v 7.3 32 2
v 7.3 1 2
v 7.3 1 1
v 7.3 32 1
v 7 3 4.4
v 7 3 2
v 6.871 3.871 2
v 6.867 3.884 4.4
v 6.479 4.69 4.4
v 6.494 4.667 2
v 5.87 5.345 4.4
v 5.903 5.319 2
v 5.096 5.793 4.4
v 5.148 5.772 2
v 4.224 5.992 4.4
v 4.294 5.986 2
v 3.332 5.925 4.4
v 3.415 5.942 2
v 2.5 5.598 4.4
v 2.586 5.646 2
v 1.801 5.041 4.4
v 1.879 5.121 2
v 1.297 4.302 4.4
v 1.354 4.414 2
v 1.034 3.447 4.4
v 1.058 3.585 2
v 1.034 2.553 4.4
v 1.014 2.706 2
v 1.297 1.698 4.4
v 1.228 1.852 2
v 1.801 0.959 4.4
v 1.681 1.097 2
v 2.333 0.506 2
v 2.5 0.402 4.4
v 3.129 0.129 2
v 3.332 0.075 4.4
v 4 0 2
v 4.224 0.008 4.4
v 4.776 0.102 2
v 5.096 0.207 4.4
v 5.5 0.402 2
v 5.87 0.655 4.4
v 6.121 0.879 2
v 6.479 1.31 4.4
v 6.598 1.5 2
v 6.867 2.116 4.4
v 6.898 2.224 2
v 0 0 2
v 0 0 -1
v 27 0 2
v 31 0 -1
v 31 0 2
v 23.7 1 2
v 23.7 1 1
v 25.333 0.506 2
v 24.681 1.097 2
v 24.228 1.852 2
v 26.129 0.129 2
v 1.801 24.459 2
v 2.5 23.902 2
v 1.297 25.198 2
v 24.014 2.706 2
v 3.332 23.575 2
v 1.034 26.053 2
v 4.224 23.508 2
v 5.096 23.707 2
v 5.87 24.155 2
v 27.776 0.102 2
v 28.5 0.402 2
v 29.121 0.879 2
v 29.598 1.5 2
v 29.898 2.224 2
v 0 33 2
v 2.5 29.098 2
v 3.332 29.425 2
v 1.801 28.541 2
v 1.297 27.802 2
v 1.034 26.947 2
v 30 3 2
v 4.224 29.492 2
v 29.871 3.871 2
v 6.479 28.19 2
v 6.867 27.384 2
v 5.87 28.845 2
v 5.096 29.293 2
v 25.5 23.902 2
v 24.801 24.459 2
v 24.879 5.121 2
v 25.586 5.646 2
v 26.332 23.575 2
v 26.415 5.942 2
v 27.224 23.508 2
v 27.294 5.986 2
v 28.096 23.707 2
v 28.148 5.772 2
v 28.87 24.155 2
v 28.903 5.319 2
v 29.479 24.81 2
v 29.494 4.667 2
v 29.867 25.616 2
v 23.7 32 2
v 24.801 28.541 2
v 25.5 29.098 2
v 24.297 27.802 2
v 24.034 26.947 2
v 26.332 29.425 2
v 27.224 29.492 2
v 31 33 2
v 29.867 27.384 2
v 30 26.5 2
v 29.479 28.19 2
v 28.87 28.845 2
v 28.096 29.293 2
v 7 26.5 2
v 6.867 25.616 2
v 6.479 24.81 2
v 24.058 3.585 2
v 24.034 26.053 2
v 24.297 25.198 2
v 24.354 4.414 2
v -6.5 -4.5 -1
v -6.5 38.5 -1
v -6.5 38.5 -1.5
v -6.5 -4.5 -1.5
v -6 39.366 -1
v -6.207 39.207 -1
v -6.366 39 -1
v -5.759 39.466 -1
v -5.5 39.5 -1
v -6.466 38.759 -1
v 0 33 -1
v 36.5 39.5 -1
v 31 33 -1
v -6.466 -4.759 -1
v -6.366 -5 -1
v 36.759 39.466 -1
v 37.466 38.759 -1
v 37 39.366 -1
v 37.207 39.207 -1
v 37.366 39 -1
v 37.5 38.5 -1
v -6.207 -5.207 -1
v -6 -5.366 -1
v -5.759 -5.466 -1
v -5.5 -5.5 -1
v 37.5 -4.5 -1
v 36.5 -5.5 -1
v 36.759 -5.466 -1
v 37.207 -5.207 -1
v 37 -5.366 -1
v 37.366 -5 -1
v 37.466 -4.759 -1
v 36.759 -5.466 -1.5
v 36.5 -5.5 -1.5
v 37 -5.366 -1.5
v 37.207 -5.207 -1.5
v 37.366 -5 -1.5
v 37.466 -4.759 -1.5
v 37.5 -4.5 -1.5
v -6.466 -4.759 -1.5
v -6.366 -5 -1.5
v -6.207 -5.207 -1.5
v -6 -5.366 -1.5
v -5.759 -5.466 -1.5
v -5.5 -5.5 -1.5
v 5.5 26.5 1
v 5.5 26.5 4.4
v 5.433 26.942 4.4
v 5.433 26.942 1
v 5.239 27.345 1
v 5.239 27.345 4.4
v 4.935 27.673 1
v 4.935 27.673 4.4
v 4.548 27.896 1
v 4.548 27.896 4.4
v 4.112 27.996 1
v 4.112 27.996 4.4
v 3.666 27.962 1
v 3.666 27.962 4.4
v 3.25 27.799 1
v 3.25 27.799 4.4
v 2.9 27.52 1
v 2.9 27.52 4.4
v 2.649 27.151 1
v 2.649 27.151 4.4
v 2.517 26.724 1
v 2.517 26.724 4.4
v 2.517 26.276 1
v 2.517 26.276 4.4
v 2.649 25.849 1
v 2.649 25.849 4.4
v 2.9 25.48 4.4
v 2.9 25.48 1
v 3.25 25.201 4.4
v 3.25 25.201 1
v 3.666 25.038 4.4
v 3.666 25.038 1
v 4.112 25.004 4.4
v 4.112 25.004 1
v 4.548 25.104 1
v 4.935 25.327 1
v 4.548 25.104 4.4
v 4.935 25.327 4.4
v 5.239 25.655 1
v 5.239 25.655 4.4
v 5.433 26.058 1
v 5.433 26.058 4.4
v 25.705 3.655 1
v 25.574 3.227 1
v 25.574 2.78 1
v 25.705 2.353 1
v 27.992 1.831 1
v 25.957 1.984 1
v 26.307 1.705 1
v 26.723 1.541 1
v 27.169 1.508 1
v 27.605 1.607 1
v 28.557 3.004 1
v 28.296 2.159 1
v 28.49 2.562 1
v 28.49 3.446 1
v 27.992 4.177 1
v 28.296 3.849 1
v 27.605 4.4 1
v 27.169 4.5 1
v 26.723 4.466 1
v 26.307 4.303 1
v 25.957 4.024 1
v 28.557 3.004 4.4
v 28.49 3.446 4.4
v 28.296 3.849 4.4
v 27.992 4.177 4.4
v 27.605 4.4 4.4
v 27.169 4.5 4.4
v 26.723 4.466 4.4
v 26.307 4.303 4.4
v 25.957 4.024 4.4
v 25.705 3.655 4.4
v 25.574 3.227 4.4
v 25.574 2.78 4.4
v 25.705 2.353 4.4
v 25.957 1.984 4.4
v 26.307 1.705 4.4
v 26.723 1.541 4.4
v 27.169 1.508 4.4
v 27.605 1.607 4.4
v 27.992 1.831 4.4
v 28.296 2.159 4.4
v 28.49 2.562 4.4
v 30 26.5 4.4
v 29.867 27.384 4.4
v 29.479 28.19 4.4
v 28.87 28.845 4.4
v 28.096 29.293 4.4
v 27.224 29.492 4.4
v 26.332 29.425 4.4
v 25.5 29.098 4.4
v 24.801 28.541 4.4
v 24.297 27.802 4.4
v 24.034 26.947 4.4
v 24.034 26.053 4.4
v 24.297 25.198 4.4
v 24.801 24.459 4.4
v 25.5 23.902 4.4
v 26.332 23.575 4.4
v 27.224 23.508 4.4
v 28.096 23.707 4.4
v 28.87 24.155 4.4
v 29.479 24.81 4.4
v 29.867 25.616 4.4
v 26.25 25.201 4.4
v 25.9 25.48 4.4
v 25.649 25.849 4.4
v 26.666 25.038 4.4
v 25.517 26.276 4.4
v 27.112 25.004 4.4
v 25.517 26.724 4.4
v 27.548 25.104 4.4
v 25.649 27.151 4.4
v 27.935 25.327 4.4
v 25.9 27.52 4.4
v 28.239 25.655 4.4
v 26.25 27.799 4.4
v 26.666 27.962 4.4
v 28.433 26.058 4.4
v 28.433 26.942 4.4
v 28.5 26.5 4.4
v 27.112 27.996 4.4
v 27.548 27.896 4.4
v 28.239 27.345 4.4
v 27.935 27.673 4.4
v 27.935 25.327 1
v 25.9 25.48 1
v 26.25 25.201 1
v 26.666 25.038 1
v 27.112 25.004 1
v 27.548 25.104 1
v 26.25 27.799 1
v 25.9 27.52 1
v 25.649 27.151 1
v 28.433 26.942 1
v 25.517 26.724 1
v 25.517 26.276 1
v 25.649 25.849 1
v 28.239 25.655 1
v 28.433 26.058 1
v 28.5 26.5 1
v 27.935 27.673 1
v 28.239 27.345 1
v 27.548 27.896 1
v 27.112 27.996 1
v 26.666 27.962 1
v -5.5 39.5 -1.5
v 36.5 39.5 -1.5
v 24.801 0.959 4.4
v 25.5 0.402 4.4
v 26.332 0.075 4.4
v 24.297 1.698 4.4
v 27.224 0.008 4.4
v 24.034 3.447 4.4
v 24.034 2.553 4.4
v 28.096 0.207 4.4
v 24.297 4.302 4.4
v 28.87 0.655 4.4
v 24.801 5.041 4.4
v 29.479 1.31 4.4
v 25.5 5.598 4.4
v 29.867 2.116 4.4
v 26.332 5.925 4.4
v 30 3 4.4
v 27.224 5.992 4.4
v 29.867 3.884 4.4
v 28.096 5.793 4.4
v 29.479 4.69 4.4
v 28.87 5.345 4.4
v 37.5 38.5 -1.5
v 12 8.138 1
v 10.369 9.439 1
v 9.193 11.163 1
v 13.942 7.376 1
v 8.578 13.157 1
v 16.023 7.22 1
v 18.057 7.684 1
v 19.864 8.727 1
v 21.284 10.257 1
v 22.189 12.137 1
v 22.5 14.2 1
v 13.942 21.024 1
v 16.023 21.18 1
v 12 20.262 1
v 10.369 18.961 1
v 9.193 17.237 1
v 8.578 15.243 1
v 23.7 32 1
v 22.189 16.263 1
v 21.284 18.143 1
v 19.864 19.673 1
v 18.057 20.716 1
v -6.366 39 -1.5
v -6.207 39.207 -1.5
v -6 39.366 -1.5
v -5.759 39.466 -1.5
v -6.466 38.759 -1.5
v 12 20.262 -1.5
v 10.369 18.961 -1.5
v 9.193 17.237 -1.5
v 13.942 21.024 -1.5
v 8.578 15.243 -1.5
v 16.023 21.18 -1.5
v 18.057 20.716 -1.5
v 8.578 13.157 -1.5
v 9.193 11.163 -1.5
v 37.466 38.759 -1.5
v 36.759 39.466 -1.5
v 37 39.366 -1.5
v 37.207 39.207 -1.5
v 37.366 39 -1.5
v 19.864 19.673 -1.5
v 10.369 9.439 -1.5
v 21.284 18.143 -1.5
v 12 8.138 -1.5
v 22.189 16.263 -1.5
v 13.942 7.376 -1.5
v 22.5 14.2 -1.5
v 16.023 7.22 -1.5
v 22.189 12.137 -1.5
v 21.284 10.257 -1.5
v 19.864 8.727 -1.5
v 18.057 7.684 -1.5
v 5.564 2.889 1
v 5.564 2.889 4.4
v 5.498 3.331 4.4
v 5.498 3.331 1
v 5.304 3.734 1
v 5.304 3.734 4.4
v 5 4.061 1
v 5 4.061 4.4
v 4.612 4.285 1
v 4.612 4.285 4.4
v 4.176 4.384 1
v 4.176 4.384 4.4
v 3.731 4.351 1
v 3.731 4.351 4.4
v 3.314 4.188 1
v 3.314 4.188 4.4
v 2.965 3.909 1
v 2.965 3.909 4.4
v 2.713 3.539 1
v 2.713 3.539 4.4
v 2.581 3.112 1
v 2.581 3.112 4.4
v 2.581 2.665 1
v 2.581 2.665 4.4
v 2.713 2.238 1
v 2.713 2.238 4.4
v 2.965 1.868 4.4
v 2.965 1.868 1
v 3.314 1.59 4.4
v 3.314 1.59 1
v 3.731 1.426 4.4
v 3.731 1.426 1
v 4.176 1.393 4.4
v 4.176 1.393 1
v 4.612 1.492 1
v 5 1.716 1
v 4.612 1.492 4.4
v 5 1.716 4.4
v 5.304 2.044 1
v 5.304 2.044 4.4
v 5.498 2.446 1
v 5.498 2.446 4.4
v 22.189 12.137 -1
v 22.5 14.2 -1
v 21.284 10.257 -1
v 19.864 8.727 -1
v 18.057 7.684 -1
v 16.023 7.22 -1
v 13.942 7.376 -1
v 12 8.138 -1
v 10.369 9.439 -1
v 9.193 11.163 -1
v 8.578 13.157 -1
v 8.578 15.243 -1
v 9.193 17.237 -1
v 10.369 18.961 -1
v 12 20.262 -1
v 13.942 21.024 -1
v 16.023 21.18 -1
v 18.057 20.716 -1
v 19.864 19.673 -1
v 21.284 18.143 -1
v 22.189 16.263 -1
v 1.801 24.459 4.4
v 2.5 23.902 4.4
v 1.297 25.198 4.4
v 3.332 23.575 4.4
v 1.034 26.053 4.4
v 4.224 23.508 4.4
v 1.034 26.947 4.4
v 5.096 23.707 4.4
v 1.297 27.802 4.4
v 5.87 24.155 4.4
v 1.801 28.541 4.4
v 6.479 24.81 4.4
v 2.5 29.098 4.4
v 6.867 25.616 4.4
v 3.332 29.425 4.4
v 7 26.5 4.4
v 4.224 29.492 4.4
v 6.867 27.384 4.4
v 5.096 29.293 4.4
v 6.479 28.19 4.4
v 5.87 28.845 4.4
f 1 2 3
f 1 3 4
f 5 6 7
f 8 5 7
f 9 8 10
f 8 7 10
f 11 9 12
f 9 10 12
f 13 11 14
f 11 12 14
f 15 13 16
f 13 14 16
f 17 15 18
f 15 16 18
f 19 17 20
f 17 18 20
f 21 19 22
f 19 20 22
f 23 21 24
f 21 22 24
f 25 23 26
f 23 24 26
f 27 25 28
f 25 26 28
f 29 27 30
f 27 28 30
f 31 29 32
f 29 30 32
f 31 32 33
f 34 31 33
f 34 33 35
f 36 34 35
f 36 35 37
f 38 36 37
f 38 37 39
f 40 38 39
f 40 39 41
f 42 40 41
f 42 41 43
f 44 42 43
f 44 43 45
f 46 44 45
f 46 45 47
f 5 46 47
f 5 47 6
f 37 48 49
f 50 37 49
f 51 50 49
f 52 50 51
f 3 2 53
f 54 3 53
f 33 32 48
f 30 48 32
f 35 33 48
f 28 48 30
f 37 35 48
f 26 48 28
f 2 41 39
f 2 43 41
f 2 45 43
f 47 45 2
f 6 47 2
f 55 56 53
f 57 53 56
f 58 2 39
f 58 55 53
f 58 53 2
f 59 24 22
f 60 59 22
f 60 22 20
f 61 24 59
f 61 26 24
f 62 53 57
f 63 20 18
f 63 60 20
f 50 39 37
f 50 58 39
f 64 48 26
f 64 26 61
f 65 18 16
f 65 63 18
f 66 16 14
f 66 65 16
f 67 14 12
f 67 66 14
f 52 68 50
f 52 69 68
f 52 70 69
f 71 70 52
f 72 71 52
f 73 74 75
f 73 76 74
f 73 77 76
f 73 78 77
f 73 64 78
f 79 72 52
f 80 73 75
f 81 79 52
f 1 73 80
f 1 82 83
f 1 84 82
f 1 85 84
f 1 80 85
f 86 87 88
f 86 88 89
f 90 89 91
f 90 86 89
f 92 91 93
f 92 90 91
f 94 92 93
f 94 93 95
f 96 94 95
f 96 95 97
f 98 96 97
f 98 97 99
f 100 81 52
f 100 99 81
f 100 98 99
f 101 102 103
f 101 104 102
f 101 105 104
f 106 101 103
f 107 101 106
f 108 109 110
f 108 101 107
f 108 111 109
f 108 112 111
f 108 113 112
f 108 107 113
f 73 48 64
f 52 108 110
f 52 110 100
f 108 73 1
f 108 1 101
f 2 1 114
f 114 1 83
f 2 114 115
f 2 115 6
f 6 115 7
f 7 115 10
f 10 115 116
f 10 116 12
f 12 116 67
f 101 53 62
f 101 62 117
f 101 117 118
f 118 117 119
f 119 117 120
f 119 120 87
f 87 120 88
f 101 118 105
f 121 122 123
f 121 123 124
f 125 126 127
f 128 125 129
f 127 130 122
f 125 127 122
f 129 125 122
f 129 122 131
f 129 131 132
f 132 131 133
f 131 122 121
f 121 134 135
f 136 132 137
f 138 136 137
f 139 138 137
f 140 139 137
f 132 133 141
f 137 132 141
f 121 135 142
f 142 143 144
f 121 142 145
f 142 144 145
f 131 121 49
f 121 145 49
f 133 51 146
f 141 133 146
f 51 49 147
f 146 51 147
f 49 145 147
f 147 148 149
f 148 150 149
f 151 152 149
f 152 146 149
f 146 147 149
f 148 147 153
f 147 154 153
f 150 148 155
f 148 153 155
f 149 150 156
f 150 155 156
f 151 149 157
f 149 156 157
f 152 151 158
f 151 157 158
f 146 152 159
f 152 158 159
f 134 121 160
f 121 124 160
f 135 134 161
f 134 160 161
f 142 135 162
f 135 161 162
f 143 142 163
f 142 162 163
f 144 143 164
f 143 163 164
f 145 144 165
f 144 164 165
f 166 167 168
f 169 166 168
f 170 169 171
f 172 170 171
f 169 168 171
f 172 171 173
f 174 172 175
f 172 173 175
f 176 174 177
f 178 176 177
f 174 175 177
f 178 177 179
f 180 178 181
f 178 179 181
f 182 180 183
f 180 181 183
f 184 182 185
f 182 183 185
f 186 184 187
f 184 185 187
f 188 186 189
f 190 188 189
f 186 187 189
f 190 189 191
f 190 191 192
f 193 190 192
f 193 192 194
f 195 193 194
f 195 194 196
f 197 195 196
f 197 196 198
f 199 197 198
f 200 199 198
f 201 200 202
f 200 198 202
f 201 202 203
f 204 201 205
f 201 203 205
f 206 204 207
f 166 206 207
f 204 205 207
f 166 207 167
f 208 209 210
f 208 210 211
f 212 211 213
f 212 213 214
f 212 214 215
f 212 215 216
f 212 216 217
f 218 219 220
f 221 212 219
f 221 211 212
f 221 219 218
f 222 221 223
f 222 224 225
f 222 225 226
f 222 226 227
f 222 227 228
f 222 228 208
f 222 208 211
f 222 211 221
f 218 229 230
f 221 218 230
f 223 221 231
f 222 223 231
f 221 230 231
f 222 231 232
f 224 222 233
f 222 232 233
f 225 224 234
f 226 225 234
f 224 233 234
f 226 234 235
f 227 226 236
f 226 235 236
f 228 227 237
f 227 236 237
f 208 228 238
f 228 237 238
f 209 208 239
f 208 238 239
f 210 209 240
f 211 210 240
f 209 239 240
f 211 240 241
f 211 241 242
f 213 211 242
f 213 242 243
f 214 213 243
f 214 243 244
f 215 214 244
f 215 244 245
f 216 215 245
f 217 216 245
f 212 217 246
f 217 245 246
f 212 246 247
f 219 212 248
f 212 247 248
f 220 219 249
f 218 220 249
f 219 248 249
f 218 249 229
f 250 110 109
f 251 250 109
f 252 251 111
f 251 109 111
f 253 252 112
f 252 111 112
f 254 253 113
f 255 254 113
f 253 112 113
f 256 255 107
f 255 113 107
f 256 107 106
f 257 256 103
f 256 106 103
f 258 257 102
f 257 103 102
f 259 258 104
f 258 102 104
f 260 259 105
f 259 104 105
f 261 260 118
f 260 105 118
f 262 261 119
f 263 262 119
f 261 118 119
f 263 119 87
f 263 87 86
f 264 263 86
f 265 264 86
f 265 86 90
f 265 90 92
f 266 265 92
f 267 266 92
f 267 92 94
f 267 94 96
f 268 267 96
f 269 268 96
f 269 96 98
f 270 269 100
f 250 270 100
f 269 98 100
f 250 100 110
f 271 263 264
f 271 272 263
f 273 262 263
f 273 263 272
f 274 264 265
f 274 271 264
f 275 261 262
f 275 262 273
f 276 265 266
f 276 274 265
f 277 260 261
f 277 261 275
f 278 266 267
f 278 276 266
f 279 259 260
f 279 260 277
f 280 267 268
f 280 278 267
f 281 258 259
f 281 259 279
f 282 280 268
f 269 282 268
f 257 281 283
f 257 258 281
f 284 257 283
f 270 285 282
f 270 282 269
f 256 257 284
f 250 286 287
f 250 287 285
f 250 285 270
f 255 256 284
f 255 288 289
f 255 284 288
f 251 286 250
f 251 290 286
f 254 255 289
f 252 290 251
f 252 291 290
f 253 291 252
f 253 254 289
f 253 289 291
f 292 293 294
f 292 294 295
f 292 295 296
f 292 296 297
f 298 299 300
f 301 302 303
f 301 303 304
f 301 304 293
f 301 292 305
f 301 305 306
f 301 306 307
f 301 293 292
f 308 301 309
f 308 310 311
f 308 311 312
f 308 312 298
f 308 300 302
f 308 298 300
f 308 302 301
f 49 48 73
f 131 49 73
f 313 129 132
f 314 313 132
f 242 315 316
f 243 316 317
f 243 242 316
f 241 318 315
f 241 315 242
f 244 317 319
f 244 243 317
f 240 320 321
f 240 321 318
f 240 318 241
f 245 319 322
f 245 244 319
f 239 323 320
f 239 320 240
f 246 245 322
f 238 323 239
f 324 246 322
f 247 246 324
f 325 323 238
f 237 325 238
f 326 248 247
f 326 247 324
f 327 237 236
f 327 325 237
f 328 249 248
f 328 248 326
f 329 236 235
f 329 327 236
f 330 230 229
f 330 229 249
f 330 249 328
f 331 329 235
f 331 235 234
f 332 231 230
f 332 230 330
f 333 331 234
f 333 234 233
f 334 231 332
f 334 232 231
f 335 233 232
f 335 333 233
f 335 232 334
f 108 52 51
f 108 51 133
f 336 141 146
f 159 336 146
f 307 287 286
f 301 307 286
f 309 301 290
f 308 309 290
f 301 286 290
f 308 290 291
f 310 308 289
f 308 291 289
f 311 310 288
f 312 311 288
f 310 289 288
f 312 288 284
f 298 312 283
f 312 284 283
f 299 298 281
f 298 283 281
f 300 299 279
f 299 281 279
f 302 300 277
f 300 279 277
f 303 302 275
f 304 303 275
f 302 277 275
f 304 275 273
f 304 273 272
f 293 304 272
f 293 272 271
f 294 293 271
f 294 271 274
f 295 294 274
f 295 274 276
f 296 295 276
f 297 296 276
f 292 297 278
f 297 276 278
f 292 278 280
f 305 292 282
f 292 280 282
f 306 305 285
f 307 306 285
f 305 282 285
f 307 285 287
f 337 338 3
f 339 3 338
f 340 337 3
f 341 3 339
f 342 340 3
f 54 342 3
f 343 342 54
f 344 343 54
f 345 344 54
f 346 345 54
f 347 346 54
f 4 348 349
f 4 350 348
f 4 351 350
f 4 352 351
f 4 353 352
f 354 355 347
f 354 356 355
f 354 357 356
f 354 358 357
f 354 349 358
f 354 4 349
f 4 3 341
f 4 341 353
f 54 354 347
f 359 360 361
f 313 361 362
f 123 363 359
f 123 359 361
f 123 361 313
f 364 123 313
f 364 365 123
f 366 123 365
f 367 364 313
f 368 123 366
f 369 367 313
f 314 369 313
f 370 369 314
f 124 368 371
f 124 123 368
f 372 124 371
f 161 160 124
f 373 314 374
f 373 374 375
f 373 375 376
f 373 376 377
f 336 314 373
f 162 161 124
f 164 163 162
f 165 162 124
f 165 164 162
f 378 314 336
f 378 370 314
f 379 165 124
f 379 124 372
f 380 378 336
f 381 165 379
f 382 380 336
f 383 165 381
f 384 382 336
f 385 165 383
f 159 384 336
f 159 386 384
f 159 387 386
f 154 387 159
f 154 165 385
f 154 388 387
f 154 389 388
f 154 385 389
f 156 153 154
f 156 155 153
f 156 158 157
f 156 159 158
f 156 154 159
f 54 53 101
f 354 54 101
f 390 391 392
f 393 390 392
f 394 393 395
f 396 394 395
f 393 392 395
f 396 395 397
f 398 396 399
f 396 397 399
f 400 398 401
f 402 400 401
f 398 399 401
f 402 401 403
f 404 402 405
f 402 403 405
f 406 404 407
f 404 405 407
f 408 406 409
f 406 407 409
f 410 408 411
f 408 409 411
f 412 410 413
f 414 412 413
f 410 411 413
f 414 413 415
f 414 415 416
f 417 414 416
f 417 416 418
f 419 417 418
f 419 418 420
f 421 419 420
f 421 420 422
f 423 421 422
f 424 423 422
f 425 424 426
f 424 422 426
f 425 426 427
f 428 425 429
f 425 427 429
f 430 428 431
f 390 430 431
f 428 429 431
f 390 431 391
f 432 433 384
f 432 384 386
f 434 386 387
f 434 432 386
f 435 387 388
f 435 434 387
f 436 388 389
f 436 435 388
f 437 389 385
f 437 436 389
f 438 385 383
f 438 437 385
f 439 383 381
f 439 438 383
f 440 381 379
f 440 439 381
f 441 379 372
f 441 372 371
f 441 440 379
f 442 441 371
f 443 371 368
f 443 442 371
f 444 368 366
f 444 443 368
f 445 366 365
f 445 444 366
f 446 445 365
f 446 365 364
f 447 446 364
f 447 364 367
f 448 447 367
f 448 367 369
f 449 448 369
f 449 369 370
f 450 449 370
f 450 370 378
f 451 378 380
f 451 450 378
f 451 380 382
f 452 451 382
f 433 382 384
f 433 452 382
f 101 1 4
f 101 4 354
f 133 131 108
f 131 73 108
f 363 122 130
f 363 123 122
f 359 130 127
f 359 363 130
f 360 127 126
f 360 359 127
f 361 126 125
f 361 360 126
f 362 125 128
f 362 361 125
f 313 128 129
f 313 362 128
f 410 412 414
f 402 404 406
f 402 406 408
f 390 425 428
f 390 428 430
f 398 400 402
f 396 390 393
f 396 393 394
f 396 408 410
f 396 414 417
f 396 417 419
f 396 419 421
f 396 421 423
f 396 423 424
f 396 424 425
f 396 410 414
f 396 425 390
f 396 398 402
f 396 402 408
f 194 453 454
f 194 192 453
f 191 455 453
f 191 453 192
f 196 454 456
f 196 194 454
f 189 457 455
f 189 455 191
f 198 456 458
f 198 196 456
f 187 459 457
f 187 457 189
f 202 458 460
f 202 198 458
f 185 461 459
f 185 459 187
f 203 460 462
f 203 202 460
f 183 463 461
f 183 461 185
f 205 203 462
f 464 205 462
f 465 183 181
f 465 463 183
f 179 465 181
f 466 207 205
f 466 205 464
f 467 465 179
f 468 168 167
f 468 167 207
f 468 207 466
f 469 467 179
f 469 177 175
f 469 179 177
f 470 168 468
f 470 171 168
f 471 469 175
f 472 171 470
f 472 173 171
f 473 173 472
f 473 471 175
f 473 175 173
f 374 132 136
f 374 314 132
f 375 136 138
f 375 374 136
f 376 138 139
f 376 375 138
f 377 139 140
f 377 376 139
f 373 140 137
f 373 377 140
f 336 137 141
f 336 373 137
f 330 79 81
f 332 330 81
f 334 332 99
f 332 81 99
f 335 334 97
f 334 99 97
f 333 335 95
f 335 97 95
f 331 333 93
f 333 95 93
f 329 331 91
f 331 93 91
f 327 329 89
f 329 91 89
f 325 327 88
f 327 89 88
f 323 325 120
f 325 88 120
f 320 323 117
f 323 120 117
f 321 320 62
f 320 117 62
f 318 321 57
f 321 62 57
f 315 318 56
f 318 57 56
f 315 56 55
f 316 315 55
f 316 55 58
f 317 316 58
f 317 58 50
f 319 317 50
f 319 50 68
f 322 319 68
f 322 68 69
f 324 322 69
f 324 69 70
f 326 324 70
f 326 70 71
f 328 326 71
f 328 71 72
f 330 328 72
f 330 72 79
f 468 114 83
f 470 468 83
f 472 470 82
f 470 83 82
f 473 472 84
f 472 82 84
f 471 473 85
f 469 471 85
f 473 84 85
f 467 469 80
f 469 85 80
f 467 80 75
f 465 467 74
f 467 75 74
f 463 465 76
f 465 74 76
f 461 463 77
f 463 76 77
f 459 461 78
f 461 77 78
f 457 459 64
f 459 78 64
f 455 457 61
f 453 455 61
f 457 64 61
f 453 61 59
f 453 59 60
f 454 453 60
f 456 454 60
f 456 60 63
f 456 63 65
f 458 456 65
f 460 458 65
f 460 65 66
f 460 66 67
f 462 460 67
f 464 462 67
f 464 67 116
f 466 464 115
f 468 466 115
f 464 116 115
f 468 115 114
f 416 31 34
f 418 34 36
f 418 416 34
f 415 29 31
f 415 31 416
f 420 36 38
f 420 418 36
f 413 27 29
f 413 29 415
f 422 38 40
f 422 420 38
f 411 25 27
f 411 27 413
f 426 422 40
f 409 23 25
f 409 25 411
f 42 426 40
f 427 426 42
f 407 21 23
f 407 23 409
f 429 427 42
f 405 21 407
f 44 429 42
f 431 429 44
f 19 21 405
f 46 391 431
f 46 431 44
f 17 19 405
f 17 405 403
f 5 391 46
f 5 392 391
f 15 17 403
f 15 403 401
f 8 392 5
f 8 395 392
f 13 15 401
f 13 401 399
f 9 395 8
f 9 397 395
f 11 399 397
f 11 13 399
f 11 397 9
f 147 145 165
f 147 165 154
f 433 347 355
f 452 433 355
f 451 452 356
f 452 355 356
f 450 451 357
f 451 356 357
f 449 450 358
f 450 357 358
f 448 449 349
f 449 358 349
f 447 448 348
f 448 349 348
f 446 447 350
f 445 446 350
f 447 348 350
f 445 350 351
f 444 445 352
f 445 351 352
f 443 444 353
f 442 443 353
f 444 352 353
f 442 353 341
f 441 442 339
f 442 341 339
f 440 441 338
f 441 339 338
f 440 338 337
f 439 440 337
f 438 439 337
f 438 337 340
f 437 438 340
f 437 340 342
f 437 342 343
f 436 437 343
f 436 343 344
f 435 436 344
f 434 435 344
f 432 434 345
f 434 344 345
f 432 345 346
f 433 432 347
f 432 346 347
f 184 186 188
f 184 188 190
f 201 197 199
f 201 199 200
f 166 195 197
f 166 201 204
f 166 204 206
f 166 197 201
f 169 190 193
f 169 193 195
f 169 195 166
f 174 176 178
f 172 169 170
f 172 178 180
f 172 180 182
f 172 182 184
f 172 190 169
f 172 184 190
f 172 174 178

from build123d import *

# Parameters (mm, degrees)
F0_W      = 31
F0_H      = 33
F1_DEPTH  = 2
F2_R      = 3
F3_DEPTH  = 2.4
F4_W      = 16.4
F4_H      = 31
F5_DEPTH  = 1
F6_R      = 1.5
F7_DEPTH  = 3.4
F8_R      = 1.5
F9_DEPTH  = 3.4
F10_R     = 7
F11_DEPTH = 25
F12_DEPTH = 1
F13_W     = 44
F13_H     = 45
F13_W_2   = 31
F13_H_2   = 33
F13_R     = 7
F14_DEPTH = 0.5
F15_R     = 1


with BuildPart() as f1:
    # F0 (on Top) → F1 (new body)
    with BuildSketch(Plane.XY):
        with Locations((15.5, 16.5)):
            Rectangle(F0_W, F0_H)
    extrude(amount=F1_DEPTH)

    # F2 (on face) → F3 (join)
    with BuildSketch(Plane.XY.offset(2)):
        with Locations((4, 3)):
            Circle(F2_R)
        with Locations((4, 26.5)):
            Circle(F2_R)
        with Locations((27, 26.5)):
            Circle(F2_R)
        with Locations((27, 3)):
            Circle(F2_R)
    extrude(amount=F3_DEPTH)

    # F4 (on face) → F5 (cut)
    with BuildSketch(Plane.XY.offset(2)):
        with Locations((15.5, 16.5)):
            Rectangle(F4_W, F4_H)
    extrude(amount=-F5_DEPTH, mode=Mode.SUBTRACT)

    # F6 (on face) → F7 (cut)
    with BuildSketch(Plane.XY.offset(4.4)):
        with Locations((27, 26.5)):
            Circle(F6_R)
    extrude(amount=-F7_DEPTH, mode=Mode.SUBTRACT)

    # F8 (on face) → F9 (cut)
    with BuildSketch(Plane.XY.offset(4.4)):
        with Locations((4, 26.5)):
            Circle(F8_R)
        with Locations((4.0643862449, 2.8885749634)):
            Circle(F8_R)
        with Locations((27.0567759871, 3.0037942342)):
            Circle(F8_R)
    extrude(amount=-F9_DEPTH, mode=Mode.SUBTRACT)

    # F10 (on face) → F11 (cut)
    with BuildSketch(Plane.XY.offset(1)):
        with Locations((15.5, 14.2)):
            Circle(F10_R)
    extrude(amount=-F11_DEPTH, mode=Mode.SUBTRACT)

    # F12 (add): a face of the model
    f12_faces = [f1.faces().sort_by_distance(p)[0] for p in [
        (0.4527692569, 16.5, 0),
    ]]
    extrude(f12_faces, amount=F12_DEPTH)

    # F13 (on face) → F14 (join)
    with BuildSketch(Plane(origin=(0, 0, -1), x_dir=(1, 0, 0), z_dir=(0, 0, -1))):
        with Locations((15.5, -17)):
            Rectangle(F13_W, F13_H)
        with Locations((15.5, -16.5)):
            Rectangle(F13_W_2, F13_H_2, mode=Mode.SUBTRACT)
        with Locations((15.5, -16.5)):
            Rectangle(F13_W_2, F13_H_2)
        with Locations((15.5, -14.2)):
            Circle(F13_R, mode=Mode.SUBTRACT)
    extrude(amount=F14_DEPTH)

    # F15
    f15_edges = [f1.edges().sort_by_distance(p)[0] for p in [
        (-6.5, -5.5, -1.25),
        (37.5, -5.5, -1.25),
        (37.5, 39.5, -1.25),
        (-6.5, 39.5, -1.25),
    ]]
    fillet(f15_edges, radius=F15_R)


solid = f1.part
